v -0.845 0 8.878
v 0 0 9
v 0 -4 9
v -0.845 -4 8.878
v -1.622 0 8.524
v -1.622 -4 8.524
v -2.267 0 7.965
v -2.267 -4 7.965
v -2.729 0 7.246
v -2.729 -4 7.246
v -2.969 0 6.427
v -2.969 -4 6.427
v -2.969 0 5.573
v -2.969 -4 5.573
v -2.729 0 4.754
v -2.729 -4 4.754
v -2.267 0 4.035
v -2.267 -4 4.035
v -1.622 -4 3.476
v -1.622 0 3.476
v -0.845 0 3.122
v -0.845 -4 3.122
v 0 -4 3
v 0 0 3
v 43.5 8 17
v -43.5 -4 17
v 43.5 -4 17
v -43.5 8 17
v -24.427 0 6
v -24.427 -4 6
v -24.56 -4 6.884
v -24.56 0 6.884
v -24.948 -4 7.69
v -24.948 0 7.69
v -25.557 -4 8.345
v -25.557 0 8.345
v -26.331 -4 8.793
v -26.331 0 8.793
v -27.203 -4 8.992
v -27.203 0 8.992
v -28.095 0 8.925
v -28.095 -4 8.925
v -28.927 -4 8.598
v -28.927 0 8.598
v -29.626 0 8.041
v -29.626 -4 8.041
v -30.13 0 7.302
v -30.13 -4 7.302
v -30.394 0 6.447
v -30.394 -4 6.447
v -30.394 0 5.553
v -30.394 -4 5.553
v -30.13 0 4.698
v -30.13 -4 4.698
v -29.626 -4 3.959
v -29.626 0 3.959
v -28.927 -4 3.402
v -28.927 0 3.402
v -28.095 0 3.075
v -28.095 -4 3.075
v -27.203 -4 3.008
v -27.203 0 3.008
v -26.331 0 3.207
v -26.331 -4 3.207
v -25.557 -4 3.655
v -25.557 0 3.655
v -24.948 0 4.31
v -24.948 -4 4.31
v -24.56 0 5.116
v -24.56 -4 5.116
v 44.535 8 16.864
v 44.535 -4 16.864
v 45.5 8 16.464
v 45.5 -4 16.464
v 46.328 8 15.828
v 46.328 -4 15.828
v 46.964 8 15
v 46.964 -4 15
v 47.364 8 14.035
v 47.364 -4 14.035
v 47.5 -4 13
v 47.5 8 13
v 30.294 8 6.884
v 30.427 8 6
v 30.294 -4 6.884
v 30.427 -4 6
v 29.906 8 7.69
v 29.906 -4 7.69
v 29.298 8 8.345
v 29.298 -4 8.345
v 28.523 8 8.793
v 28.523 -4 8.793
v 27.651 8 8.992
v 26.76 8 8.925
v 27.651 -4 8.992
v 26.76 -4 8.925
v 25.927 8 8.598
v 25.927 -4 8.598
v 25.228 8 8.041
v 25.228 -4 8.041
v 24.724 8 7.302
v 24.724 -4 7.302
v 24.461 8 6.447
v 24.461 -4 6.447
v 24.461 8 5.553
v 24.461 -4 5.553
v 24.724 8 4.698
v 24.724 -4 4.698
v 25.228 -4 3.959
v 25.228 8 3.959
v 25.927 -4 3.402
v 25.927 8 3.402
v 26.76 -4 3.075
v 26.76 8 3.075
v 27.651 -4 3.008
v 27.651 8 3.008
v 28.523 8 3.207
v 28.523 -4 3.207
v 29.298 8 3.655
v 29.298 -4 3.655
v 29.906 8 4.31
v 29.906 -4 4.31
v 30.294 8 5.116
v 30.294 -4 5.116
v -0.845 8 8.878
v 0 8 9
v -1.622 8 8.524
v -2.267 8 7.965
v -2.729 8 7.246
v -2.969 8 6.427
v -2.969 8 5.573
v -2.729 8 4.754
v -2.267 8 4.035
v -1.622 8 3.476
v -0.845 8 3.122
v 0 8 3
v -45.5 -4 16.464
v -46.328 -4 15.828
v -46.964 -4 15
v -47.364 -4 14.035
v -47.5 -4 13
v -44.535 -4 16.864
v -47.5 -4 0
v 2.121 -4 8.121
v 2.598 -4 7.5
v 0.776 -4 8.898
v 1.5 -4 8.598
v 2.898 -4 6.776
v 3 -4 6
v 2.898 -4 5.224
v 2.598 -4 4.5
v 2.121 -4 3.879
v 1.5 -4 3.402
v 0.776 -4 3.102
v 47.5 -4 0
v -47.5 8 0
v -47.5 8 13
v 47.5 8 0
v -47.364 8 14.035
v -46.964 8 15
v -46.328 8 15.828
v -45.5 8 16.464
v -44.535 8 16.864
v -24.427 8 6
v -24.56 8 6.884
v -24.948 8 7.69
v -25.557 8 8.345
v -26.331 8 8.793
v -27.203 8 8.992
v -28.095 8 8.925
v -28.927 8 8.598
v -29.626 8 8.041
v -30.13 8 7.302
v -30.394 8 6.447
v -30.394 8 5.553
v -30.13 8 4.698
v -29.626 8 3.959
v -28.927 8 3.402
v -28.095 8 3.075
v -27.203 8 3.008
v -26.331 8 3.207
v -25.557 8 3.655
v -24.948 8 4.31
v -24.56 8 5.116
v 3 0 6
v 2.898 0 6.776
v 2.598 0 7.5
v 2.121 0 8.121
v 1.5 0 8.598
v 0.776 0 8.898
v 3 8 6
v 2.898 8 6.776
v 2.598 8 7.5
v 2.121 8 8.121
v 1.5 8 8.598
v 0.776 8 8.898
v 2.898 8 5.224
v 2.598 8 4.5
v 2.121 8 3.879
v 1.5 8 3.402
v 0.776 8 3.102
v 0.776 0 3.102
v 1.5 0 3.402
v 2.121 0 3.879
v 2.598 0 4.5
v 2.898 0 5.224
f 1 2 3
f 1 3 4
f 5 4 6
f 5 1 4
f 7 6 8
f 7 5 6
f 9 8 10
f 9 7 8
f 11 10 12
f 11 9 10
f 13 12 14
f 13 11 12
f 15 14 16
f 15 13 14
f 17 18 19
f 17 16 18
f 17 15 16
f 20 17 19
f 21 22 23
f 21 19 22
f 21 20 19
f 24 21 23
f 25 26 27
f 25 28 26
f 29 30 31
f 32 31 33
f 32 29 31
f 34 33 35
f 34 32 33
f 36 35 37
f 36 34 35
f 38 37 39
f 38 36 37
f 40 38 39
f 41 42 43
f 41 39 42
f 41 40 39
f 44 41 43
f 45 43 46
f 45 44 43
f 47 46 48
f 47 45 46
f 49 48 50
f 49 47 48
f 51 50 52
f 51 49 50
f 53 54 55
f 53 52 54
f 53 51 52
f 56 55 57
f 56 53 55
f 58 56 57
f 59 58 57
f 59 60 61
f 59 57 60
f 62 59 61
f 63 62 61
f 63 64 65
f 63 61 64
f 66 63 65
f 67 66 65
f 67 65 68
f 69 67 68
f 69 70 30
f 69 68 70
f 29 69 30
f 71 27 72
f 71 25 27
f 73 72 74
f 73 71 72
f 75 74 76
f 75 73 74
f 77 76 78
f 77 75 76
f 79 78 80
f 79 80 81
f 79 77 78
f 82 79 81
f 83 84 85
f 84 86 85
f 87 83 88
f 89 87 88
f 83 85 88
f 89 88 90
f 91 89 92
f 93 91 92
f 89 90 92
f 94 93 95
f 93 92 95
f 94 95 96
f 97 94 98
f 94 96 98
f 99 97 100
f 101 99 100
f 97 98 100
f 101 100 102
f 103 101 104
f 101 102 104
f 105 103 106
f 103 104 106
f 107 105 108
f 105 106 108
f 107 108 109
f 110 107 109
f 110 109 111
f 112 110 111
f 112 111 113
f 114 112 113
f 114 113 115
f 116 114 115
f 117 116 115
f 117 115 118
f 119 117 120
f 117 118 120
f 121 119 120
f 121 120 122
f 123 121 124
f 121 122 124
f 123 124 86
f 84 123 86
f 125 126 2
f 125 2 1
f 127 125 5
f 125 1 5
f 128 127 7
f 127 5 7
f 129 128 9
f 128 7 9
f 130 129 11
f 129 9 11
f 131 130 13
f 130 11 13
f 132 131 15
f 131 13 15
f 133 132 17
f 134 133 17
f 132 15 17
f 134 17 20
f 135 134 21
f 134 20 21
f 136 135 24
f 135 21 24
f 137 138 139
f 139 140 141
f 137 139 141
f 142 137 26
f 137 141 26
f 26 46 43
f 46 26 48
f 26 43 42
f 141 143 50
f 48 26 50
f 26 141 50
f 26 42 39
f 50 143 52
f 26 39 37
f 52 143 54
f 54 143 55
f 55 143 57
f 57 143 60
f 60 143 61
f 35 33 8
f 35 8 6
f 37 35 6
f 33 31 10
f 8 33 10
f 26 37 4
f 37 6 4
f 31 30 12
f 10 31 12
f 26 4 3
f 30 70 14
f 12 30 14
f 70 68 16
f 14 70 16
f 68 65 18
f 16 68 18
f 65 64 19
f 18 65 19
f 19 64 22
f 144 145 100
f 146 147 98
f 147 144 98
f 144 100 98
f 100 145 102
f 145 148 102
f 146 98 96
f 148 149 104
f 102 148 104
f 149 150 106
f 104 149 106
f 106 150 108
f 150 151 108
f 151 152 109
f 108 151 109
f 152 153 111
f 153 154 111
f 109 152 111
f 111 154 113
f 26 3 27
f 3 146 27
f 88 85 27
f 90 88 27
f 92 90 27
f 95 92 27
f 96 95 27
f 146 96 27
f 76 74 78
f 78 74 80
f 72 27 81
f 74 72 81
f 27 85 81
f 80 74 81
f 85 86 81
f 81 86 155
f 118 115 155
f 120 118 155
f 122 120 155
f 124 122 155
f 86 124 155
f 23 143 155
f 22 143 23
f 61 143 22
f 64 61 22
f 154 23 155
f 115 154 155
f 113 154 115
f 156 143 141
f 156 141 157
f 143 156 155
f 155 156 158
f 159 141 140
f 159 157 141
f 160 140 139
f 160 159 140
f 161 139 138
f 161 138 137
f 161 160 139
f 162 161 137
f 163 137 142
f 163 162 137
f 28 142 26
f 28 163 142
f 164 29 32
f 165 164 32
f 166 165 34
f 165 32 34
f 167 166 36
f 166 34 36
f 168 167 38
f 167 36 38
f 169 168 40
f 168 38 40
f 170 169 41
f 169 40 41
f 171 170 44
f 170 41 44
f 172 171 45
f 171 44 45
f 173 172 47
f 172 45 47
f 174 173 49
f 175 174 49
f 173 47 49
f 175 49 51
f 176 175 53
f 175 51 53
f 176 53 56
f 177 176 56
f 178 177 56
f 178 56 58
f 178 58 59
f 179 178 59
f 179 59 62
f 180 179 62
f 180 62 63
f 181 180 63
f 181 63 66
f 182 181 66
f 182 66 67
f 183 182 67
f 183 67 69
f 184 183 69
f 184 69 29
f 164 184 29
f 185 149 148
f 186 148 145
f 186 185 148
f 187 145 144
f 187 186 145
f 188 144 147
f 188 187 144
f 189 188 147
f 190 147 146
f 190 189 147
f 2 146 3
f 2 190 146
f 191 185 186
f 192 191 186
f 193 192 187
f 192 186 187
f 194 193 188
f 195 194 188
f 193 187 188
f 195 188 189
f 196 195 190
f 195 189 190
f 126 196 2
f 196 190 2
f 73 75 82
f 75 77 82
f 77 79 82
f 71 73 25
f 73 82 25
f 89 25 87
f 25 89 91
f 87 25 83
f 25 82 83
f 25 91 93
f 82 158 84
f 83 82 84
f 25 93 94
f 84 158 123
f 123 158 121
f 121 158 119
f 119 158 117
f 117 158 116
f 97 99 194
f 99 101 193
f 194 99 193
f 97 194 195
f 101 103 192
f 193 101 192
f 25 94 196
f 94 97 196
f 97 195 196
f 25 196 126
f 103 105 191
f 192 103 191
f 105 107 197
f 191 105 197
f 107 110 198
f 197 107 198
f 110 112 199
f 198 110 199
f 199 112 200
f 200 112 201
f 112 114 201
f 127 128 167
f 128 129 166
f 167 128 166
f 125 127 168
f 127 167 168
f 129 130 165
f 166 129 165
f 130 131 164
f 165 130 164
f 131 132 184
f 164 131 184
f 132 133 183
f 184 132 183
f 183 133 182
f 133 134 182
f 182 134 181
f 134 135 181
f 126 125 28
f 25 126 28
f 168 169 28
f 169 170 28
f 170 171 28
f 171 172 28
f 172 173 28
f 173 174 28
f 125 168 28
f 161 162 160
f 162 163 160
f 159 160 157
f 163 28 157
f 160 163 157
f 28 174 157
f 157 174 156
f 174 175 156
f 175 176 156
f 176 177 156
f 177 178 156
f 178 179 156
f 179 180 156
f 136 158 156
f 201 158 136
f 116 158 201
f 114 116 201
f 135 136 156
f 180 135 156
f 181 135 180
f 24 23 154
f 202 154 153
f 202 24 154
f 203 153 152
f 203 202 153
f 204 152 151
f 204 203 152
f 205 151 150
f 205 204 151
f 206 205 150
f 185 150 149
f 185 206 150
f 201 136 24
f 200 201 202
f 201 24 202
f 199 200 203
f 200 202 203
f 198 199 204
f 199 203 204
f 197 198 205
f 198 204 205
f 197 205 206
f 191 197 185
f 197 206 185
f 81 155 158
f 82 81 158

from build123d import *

# Parameters (mm, degrees)
F0_R     = 3
F0_W     = 10
F0_H     = 12
F1_DEPTH = 17
F2_R     = 3
F3_DEPTH = 12.5
F4_R     = 4


with BuildPart() as f1:
    # F0 (on Top) → F1 (new body)
    with BuildSketch(Plane.XY):
        with BuildLine():
            ThreePointArc((-12, -4), (-18, 2.0000000001), (-11.9999999997, 8))
            Line((-11.9999999997, 8), (-37.5, 8))
            Line((-37.5, 8), (-37.5, -4))
            Line((-37.5, -4), (-12, -4))
        make_face()
        with BuildLine():
            ThreePointArc((-6, 2), (-7.7573593128, 6.242640687), (-11.9999999997, 8))
            ThreePointArc((-11.9999999997, 8), (-18, 2.0000000001), (-12, -4))
            ThreePointArc((-12, -4), (-7.7573593129, -2.2426406871), (-6, 2))
        make_face()
        with Locations((-12, 2)):
            Circle(F0_R, mode=Mode.SUBTRACT)
        with Locations((-12, 2)):
            Circle(F0_R)
        with BuildLine():
            ThreePointArc((12, -4), (6, 2), (12, 8))
            Line((12, 8), (-11.9999999997, 8))
            ThreePointArc((-11.9999999997, 8), (-7.7573593128, 6.242640687), (-6, 2))
            ThreePointArc((-6, 2), (-7.7573593129, -2.2426406871), (-12, -4))
            Line((-12, -4), (12, -4))
        make_face()
        with BuildLine():
            ThreePointArc((12, -4), (16.2426406871, -2.2426406871), (18, 2))
            ThreePointArc((18, 2), (16.2426406871, 6.2426406871), (12, 8))
            ThreePointArc((12, 8), (6, 2), (12, -4))
        make_face()
        with Locations((12, 2)):
            Circle(F0_R, mode=Mode.SUBTRACT)
        with Locations((12, 2)):
            Circle(F0_R)
        with BuildLine():
            ThreePointArc((12, 8), (16.2426406871, 6.2426406871), (18, 2))
            ThreePointArc((18, 2), (16.2426406871, -2.2426406871), (12, -4))
            Line((12, -4), (37.5, -4))
            Line((37.5, -4), (37.5, 8))
            Line((37.5, 8), (12, 8))
        make_face()
        with Locations((-42.5, 2)):
            Rectangle(F0_W, F0_H)
        with Locations((42.5, 2)):
            Rectangle(F0_W, F0_H)
    extrude(amount=F1_DEPTH)

    # F2 (on Front) → F3 (cut, symmetric)
    with BuildSketch(Plane.XZ):
        with BuildLine():
            ThreePointArc((0, 9), (-3, 6), (0, 3))
            Line((0, 3), (0, 9))
        make_face()
        with BuildLine():
            Line((0, 9), (0, 3))
            ThreePointArc((0, 3), (2.1213203436, 3.8786796564), (3, 6))
            ThreePointArc((3, 6), (2.1213203436, 8.1213203436), (0, 9))
        make_face()
        with Locations((-27.4271778762, 6)):
            Circle(F2_R)
        with Locations((27.4271778762, 6)):
            Circle(F2_R)
    extrude(amount=F3_DEPTH, both=True, mode=Mode.SUBTRACT)

    # F4
    f4_edges = [f1.edges().sort_by_distance(p)[0] for p in [
        (-47.5, 2, 17),
        (47.5, 2, 17),
    ]]
    fillet(f4_edges, radius=F4_R)


solid = f1.part
